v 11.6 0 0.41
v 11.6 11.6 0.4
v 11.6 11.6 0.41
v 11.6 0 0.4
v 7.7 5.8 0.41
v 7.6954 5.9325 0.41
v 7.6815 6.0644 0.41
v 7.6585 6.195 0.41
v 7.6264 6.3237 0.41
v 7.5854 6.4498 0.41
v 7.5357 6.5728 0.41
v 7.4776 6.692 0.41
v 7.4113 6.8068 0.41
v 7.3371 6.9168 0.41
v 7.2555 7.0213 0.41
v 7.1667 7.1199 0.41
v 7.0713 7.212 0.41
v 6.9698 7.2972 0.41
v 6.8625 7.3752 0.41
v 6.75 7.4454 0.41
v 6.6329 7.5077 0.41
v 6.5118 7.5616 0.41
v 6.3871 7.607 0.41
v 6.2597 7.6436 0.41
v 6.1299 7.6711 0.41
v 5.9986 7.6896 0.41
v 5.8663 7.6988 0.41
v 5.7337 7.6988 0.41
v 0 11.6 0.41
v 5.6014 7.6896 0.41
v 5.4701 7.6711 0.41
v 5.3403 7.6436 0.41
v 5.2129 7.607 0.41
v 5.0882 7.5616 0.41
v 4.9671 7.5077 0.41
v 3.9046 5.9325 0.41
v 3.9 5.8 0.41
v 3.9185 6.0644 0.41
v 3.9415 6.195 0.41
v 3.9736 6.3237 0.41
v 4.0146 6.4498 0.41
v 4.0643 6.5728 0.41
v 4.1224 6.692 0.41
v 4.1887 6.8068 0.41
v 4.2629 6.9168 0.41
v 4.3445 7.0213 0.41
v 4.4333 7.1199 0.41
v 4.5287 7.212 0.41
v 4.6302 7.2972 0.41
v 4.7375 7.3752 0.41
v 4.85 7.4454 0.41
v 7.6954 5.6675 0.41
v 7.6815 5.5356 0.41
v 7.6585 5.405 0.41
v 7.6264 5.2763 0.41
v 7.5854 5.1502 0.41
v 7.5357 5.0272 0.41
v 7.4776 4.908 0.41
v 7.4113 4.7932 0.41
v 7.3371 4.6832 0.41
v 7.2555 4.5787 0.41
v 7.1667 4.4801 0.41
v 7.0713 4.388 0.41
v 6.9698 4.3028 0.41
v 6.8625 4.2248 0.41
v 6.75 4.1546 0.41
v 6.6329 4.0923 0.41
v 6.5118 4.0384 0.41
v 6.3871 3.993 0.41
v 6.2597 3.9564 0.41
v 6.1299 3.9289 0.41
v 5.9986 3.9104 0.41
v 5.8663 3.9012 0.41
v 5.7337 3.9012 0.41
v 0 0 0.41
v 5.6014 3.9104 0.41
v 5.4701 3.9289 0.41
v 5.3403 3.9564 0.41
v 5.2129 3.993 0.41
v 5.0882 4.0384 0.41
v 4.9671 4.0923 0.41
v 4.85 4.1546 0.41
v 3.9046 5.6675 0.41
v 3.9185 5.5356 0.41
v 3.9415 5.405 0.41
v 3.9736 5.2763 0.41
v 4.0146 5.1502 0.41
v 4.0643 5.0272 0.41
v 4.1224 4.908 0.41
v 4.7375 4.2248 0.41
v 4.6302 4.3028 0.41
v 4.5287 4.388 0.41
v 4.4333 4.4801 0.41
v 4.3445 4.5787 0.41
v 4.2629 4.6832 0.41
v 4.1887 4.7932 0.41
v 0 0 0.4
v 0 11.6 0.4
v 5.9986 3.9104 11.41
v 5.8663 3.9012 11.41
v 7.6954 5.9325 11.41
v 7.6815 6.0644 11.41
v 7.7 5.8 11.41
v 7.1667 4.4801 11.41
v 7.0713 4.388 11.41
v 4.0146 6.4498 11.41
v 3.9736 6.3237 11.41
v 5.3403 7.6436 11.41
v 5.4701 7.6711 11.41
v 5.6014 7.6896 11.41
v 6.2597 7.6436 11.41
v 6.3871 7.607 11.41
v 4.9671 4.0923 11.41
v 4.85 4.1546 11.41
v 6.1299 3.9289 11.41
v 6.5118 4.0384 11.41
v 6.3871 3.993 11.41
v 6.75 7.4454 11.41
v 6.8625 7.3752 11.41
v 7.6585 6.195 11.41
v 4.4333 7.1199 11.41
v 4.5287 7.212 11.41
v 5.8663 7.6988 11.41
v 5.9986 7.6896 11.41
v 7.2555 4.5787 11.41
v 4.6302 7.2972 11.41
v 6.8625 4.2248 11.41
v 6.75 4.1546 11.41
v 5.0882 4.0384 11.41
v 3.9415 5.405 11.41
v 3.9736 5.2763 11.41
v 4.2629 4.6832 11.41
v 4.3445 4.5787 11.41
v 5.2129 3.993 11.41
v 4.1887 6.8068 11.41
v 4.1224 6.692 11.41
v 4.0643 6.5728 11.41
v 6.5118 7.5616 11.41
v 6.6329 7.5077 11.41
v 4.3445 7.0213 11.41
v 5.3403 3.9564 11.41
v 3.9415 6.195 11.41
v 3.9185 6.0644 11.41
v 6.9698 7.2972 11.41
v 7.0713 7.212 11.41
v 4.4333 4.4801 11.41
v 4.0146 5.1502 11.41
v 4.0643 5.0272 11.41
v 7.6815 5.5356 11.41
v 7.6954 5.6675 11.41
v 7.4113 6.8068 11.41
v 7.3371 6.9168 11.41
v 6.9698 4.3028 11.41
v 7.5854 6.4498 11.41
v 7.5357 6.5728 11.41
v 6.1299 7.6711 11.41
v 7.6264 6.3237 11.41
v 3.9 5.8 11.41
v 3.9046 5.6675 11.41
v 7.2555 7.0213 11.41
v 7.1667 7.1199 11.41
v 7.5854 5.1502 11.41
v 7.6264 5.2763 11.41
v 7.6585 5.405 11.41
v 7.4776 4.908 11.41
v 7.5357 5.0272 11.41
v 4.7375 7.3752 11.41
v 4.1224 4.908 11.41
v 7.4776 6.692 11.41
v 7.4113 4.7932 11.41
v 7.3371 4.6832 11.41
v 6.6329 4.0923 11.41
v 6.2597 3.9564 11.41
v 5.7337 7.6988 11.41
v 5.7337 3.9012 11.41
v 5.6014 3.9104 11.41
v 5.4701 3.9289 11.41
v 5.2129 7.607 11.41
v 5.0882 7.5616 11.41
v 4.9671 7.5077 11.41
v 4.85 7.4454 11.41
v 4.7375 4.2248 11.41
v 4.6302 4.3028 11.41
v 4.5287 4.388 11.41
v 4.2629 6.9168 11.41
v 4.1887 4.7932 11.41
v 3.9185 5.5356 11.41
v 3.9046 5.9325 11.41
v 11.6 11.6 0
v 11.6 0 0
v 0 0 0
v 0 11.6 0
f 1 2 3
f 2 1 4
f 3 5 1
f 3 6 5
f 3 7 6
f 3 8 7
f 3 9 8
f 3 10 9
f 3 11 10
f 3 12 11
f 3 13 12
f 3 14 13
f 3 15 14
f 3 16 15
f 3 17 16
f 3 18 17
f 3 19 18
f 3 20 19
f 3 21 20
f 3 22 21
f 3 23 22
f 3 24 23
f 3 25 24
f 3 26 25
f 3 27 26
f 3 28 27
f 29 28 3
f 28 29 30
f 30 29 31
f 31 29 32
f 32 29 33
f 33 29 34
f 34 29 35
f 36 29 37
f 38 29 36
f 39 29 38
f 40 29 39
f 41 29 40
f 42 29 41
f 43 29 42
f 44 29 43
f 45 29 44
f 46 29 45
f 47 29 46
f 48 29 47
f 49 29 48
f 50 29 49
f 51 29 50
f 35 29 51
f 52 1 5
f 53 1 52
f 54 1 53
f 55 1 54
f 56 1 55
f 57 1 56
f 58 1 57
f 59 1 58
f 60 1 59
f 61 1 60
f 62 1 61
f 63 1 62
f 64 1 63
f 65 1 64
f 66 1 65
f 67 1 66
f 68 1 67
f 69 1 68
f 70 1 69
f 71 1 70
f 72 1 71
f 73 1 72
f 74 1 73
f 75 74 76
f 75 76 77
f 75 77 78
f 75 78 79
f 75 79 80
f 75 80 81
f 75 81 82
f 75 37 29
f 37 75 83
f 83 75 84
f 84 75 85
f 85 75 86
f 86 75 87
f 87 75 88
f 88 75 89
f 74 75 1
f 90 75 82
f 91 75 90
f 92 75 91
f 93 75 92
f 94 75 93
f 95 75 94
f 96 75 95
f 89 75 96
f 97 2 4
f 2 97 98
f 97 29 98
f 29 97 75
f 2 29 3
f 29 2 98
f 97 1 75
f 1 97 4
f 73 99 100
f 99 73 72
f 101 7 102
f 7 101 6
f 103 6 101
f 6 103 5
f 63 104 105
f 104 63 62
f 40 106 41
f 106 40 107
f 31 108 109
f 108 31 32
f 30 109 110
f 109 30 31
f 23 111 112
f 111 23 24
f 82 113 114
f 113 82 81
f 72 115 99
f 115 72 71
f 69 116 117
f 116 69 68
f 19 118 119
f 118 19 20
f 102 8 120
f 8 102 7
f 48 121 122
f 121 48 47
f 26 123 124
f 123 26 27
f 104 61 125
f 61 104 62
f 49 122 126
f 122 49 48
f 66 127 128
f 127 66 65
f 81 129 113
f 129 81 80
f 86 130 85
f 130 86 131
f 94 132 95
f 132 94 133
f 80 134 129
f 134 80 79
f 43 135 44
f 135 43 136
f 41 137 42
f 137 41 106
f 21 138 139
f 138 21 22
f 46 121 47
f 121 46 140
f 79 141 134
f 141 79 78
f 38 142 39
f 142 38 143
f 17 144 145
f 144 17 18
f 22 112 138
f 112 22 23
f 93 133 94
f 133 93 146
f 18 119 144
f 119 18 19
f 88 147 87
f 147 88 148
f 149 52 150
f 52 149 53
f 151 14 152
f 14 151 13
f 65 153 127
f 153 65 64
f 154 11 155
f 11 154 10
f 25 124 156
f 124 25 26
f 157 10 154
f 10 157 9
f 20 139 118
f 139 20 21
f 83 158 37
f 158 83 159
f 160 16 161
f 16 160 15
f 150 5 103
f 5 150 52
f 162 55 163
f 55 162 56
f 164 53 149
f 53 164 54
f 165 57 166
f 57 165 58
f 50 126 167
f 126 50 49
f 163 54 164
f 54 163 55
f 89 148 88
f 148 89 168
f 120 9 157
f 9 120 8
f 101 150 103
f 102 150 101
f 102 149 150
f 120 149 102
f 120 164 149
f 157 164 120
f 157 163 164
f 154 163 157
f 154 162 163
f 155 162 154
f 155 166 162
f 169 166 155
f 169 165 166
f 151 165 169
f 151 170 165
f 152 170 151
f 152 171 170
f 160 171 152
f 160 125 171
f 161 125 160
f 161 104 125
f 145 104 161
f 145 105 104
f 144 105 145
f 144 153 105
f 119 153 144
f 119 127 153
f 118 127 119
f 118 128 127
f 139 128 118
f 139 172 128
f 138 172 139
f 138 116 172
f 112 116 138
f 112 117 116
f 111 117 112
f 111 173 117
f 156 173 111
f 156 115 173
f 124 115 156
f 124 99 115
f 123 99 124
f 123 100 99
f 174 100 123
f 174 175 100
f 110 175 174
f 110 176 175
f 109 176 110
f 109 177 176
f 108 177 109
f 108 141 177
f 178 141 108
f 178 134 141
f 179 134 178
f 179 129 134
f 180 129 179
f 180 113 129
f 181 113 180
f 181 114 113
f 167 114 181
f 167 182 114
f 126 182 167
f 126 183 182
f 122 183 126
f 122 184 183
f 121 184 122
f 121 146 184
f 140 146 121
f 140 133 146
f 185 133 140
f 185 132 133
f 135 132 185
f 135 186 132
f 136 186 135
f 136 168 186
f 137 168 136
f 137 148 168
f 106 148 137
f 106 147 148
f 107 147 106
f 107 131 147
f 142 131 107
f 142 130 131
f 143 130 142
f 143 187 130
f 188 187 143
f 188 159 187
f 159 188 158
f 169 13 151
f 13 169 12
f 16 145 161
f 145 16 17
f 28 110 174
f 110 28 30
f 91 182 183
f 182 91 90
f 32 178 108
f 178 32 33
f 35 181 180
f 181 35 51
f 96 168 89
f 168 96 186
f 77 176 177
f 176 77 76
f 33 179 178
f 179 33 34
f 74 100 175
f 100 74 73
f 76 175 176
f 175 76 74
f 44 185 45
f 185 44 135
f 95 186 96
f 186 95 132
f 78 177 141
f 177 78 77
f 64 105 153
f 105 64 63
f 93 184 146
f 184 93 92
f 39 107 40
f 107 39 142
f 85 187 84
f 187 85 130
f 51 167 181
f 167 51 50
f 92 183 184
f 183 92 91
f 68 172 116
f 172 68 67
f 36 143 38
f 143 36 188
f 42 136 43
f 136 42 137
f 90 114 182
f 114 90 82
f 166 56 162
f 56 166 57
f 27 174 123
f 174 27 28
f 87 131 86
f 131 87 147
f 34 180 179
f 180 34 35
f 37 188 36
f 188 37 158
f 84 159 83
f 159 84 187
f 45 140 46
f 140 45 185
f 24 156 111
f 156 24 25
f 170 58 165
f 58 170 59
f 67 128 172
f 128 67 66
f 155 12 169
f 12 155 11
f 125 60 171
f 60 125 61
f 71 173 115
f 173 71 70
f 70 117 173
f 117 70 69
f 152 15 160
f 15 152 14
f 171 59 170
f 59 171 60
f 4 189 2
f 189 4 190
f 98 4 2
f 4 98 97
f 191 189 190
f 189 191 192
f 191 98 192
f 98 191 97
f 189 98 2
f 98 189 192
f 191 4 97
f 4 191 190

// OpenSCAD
// file: ../../Base/Rotation.scad
// Fischertechnik Box Foundation
// Geometry Helpers Rotation

include <PlacementOptions.scad>

// getRotatedSpace(space, rotation=NoRotation)
// Rotates the space dependent on the specified rotation

function getRotatedSpace(space, rotation=NoRotation) = [
    (rotation == Rotate90 || rotation == Rotate270) ? space.y : space.x,
    (rotation == Rotate90 || rotation == Rotate270) ? space.x : space.y
];

// Rotates the given space around the fixed left lower corner
// space = the space the children needs as width/depth list [width,depth]
// rotation = 0 Rotate0 degrees, 1 Rotate90 degrees, 2 Rotate180 degrees, 3 Rotate270 degrees (equivalent to -90)

module RotateFix(space, rotation=NoRotation) {
    dy = (rotation == Rotate0 || rotation == Rotate270) ? 0 :
        (rotation == Rotate90) ? space.x :
        space.y;
    dx = (rotation < Rotate180) ? 0 :
        (rotation == Rotate180) ? space.x :
        space.y;
    
    translate([dx, dy, 0])
        rotate([0, 0, rotations[rotation]])
            children();
}
// file: ../../Base/Alignment.scad
// Fischertechnik Box Foundation
// Geometry Helpers Alignment

include <PlacementOptions.scad>

// getAlignedX(elementWidth, spaceWidth, align=AlignRight, offset=0)
// Gets the aligned X offset of an element with the given
// width in the given space.
// elementWidth = The width of the element to positon
// spaceWidth = The space where the element should be aligned
// align = 0 AlignLeft, 1 AlignCenter, 2 AlignRight
// offset = an optional offset from the aligned position. When
// aligned left or centered, then positive values are in X direction.
// When aligned right then positive values are in negative X direction.

function getAlignedX(elementWidth, spaceWidth, align=AlignRight, offset=0) =
    (align == AlignLeft) ?
        offset :
        ((align == AlignCenter) ?
        (spaceWidth - elementWidth)/2 + offset :
        spaceWidth - offset - elementWidth);

// getAlignedY(elementDepth, spaceDepth, align=AlignTop, offset=0)
// Gets the aligned Y offset of an element with the given
// depth in the given space.
// elementDepth = The depth of the element to positon
// spaceDepth = The space where the element should be aligned
// align = 0 AlignBottom, 1 AlignCenter, 2 AlignTop
// offset = an optional offset from the aligned position. When
// aligned bottom or centered, then positive values are in Y direction.
// When aligned top then positive values are in negative Y direction.

function getAlignedY(elementDepth, spaceDepth, align=AlignTop, offset=0) =
    (align == AlignBottom) ?
        offset :
        ((align == AlignCenter) ?
        (spaceDepth - elementDepth)/2 + offset :
        spaceDepth - offset - elementDepth);
// file: ../../Base/PlacementOptions.scad
// Fischertechnik Box Foundation
// Placement Options

// Alignment
NoAlign = 0;
AlignLeft = 1;
AlignBottom = 2;
AlignCenter = 3;
AlignRight = 4;
AlignTop = 5;

// Element rotation degree steps
rotations = [0, -90, -180, -270];

// Rotation
NoRotation = 0;
Rotate0 = 0;
Rotate90 = 1;
Rotate180 = 2;
Rotate270 = 3;

// Docking (seen from above)
NoDock = -1;
DockLeft = 0;
DockTop = 1;
DockRight = 2;
DockCorner = 2;
DockBottom = 3;

// Web corners
LowerLeft = 0;
UpperLeft = 1;
UpperRight = 2;
LowerRight = 3;

// Web position relative to corner
LeftOfCorner = 0;
RightOfCorner = 1;

// Rails direction
Horizontal = true;
Vertical = false;
// file: ../../Base/Boxes.scad
// Fischertechnik Box Foundation
// Pre-designed Boxes

use <Constants.scad>

include <PlacementOptions.scad>

box190Width = 190;
box190Depth = 130;
box130Width = 130;
box130Depth = 95;

// Values are from an original ec3 box
topBottomDifference = 1.5;
outerHeight = 40;
baseThickness = 1.8;
innerHeight = outerHeight - baseThickness;
stackExcess = 5.7;
radius = 3.5;
wallThickness = 1.5;
tolerance = 0.2;

boxWallThickness = wallThickness;
boxBaseThickness = baseThickness;
boxWebWidth = 3.0;

// getBoxWallThickness()
// Gets the wall thickness of a Fischertechnik Box
function getBoxWallThickness() = boxWallThickness;

// getBoxUsageHeight(height = 38.2)
// Gets the usable height of a Fischertechnik box
// height = Outer height of the box from the bottom to the upper edge.
function getBoxUsageHeight(height = outerHeight) = height - baseThickness - stackExcess;

// getBoxInnerHeight()
// Gets the inner height of a Fischertechnik box, including the stack excess
function getBoxInnerHeight() = innerHeight;

// getBoxBaseThickness()
// Gets the thickness of the Fischertechnik box base.
function getBoxBaseThickness() = boxBaseThickness;

// getBoxWebWidth()
// Gets the width of a box web
function getBoxWebWidth() = boxWebWidth;

// getBox190Space()
// Gets the usable inner space of a Box 190 as an x/y-list
function getBox190Space() = [
    box190Width - 2*getBoxWallThickness() - topBottomDifference, 
    box190Depth - 2*getBoxWallThickness() - topBottomDifference ];

// RoundedCornerPlate(width, depth, height, radius)
// Creates a body plate with rounded corners for a box. Used
// also to create the complete box with the hull module.
// width = Width of the plate
// depth = depth of the plate 
// height = thickness of the plate
// radius = radius of the rounded corner
module RoundedCornerPlate(width, depth, height, radius) {
    translate([radius, radius])
    hull() {
        w = width-2*radius;
        d = depth-2*radius;
        cube([w, d, height]);
        cylinder(height, r=radius, $fn=getFragments());
        translate([w, 0])
            cylinder(height, r=radius, $fn=getFragments());
        translate([w, d])
            cylinder(height, r=radius, $fn=getFragments());
        translate([0, d])
            cylinder(height, r=radius, $fn=getFragments());
    }
}

// BoxBase(width, depth)
// Creates an empty stackable Fischertechnik compatible box
// width = Outer width of the box (190, 130, ...)
// depth = Outer depth of the box (130, 95, ...)

module BoxBase(width, depth, height=outerHeight) {    
    thinPlate = 0.01;

    innerHeight = height - baseThickness;    
    
    module Body(tolerance=tolerance) {
        hull() {
            // Bottom with tolerance to fit into the original boxes when stacked
            translate([-wallThickness+tolerance, -wallThickness+tolerance, -baseThickness])
                RoundedCornerPlate(width-topBottomDifference-2*tolerance, depth-topBottomDifference-2*tolerance, thinPlate, radius);
            
            // Top
            translate([-wallThickness-topBottomDifference/2, -wallThickness-topBottomDifference/2, innerHeight-thinPlate])
                RoundedCornerPlate(width, depth, thinPlate, radius);
         }
    }

    module Cutoff() {
        hull() {
            coWidth = width - 2*wallThickness;
            coDepth = depth - 2*wallThickness;
            
            // Bottom
            RoundedCornerPlate(coWidth-topBottomDifference, coDepth-topBottomDifference, thinPlate, radius);

            // Top
            translate([-topBottomDifference/2, -topBottomDifference/2, innerHeight+thinPlate]) 
                RoundedCornerPlate(coWidth, coDepth, thinPlate, radius);
        }
    }
    
    difference() {        
        Body();
        Cutoff();
        stackOffset = innerHeight - stackExcess;
        translate([0, 0, stackOffset + baseThickness])
            Body(tolerance=0);
    }
}

// Creates the Fischertechnik empty box 130x190 mm and places it at position 0,0
// 190x130 are the outer sizes, the inner space is slightly smaller. Use getBox190Space() to get the inner sizes.
// The box is positioned that the usable inner space is at the 0,0,0 position.

module Box190() {
    BoxBase(box190Width, box190Depth);
}

// Gets the usable inner space of a Box 130 as an x/y-list
function getBox130Space() = [
    box130Width - 2*getBoxWallThickness() - topBottomDifference, 
    box130Depth - 2*getBoxWallThickness() - topBottomDifference ];

// Creates the Fischertechnik empty box 95x130 mm and places it at position 0,0
// 190x130 are the outer sizes, the inner space is slightly smaller. Use getBox190Space() to get the inner sizes.
// The box is positioned that the usable inner space is at the 0,0,0 position.

module Box130() {
    BoxBase(box130Width, box130Depth);
}

// Creates a web at the specified box walls
// corner 0 = LowerLeft, 1 = UpperLeft, 2 = UpperRight, 3 = LowerRight
// side 0 = LeftOfCorner, 1 = RightOfCorner
// distance = Distance in mm from the corner
// boxSpace = inner width and depth of the box (default: Box 190)
// webWidth = length of the web (default is 3 mms)
// webThickness = thickness of the web (default is 1 mm)
// height = Height of the web (standard is getBoxUsageHeight())
// sink = How much of the web is sunk into the wall

module BoxWeb(
    corner, 
    side, 
    distance, 
    boxSpace=getBox190Space(), 
    webWidth=getBoxWebWidth(), 
    webThickness=1.0, 
    height=getBoxUsageHeight(),
    sink = getBoxWallThickness()/2) {
    width = (corner % 2 == 0) ? 
            (side == LeftOfCorner ? webWidth : webThickness) :
            (side == LeftOfCorner ? webThickness : webWidth);

    depth = (corner % 2 == 0) ? 
            (side == RightOfCorner ? webWidth : webThickness) :
            (side == RightOfCorner ? webThickness : webWidth);
    
    xDiff = corner == LowerLeft ? 
                (side == LeftOfCorner ? -sink : distance) :
            (corner == UpperLeft ?                
                (side == LeftOfCorner ? distance : -sink) :
            (corner == UpperRight ?
                (side == LeftOfCorner ? boxSpace.x-webWidth+sink : boxSpace.x-distance-webThickness) :
                (side == LeftOfCorner ? boxSpace.x-distance-webThickness: boxSpace.x-webWidth+sink)));

    yDiff = corner == LowerLeft ? 
                (side == RightOfCorner ? -sink : distance) :
            (corner == UpperLeft ?
                (side == RightOfCorner ? boxSpace.y-distance-webThickness : boxSpace.y-webWidth+sink) :
            (corner == UpperRight ?
                (side == RightOfCorner ? boxSpace.y-webWidth+sink : boxSpace.y-distance-webThickness) :
                (side == RightOfCorner ? distance : -sink)));
    
    translate([xDiff, yDiff, -getExcess()])
        cube([width, depth, height + 2*getExcess()]);
}
// file: ../../Base/Placement.scad
// Fischertechnik Box Foundation
// Geometry Helpers Placement

use <Constants.scad>
use <Alignment.scad>
use <Rotation.scad>
use <Boxes.scad>

include <PlacementOptions.scad>

// Place(x=0, y=0, elementSpace=[0,0], alignX=AlignLeft, alignY=AlignBottom, rotation=Rotate0, boxSpace=getBox190Space())
// Places the child at the specified position
// y = Y-Position. This is a relative position when an X aligment is specified.
// x = X-Position. This is a relative position when an Y aligment is specified.
// elementSpace = space of the element to be placed [x,y]
// alignX = -1=NoAlign, 0 AlignLeft, 1 AlignCenter, 3 AlignRight (elementSpace and boxSpace required!)
// alignY = -1=NoAlign, 2 AlignBottom, 1 AlignCenter, 4 AlignTop (elementSpace and boxSpace required!)
// rotation = 0 Rotate0 0 degrees, 1 Rotate90 90 degrees, 
// 2 Rotate180 180 degrees, 3 Rotate270 270 degrees (equivalent to -90)
// boxSpace = Inner space of the box where the placement occurs [x,y] - default is Box 190x130 inner space

module Place(x=0, y=0, elementSpace=[0,0], 
  alignX=AlignLeft, alignY=AlignBottom, 
  rotation=NoRotation, boxSpace=getBox190Space()) {

    module Position(x, y, space, rotation=Rotate0) {
        translate([x, y, 0])
            RotateFix(space, rotation)
                children();
    }

    space = getRotatedSpace(elementSpace, rotation);
    alignedX = getAlignedX(space.x, boxSpace.x, alignX, x);
    alignedY = getAlignedY(space.y, boxSpace.y, alignY, y);
    Position(alignedX, alignedY, elementSpace, rotation)
        children();
}

// Center(space=getBox130Space(), elementSpace=[0,0])
// space = Space where the children is centered. For cylinder use centered=true and no elementSpace.
// elementSpace = space of the element to be centered [x,y]

module Center(space=getBox190Space(), elementSpace=[0,0]) {
    Place(elementSpace=elementSpace, boxSpace=space, alignX=AlignCenter, alignY=AlignCenter)
        children();
}

// CenterHorizontal(width=0, y=0, offset=0, space=getBox130Space())
// width = Width of the element to be placed.
// y = Y position of the element
// offset = Offset from the center position (negative will be left of the center)
// space = Space where the element is placed

module CenterHorizontal(width=0, y=0, offset=0, space=getBox190Space()) {
    Place(x=offset, y=y, elementSpace=[width, 0], boxSpace=space, alignX=AlignCenter)
        children(0);
}

// CenterVertical(depth=0, x=0, offset=0, space=getBox130Space())
// depth = Depth of the element to be placed.
// x = X position of the element
// offset = Offset from the center position (negative will be down of the center)
// space = Space where the element is placed

module CenterVertical(depth=0, x=0, offset=0, space=getBox190Space()) {
    Place(x=x, y=offset, elementSpace=[0, depth], boxSpace=space, alignY=AlignCenter)
        children(0);
}

// getIsVertical(align)
// True if the specified alignment needs a vertical orientation for a divider (AlignRight, AlignLeft)

function getIsVertical(align) = (align == AlignRight || align == AlignLeft);

// getIsHorizontal(align)
// True if the specified alignment needs a horizontal orientation for a divider (AlignTop, AlignBottom)

function getIsHorizontal(align) = (align == AlignTop || align == AlignBottom);
// file: ../../Elements/AxisClip10.scad
// Fischertechnik Box Library
// Axis for clip 10
// 31023

use <../ModelBase/Simple.scad>
use <../Base/Constants.scad>

/* [Element Parameters] */
height = 23;
clipHeight = 10;

/* [Hidden] */
width = 12;
depth = 12;
upperDiameter = 3.6;

// getAxisClip10Space()
// Gets the space of a n axis for a clip 10 with spring ring (mot2)

function getAxisClip10Space() = [width, depth, height];

// AxisClip10(height, clipHeight)
// Axis for clip 10 with spring ring (mot2)
// height = Height of the complete axis (standard is 23, in mot3 its only 12)
// clipHeight = Height of the part for the clip (standard is 10, in mot3 its only 7)

module AxisClip10(height=height, clipHeight=clipHeight) {
    LeveledAxisWithSpace(height, height-clipHeight, getAxisClip10Space(), diameter=upperDiameter);
}

// Test
color("lightgray")
AxisClip10(height, clipHeight);
// file: ../../Base/Constants.scad
// Fischertechnik Box Foundation
// Constants

// Constant values necessary for multiple elements

// Base constants
dividerThickness = 1.2;
excess = 0.01;
fragments = 90;
tolerance = 0.8;

// Gets the thickness of a divider 
function getDividerThickness() = dividerThickness;

// Gets the excess that is used to merge walls into each other
function getExcess() = excess;

// Gets amount of fragments of a cylinder
function getFragments() = fragments;

// Gets the inner tolerance of a frame to each side
function getTolerance() = tolerance;


// Fischertechnik specific constants
axisDiameter = 4;
axisBottomDiameter = axisDiameter + 1;
axisTolerance = 0.2;
axisLockingLength = 8;

// Gets axis diameter of Fischertechnik axis
function getAxisDiameter() = axisDiameter;

// Gets axis diameter tolerance (subtracted for element axis)
function getAxisTolerance() = axisTolerance;

// Gets the axis diameter for standing axis
function getStandAxisDiameter() = getAxisDiameter() - getAxisTolerance();

// Gets axis bottom diameter for thicker part at the bottom
function getAxisBottomDiameter() = axisBottomDiameter;

// Gets the lengthh of the locking part of a locking axis
function getAxisLockingLength() = axisLockingLength;

// Studs

studHeight = 2.5;
studTolerance = 0.2;

// gets the height of a connecting stud
function getStudHeight() = studHeight;

// gets the connecting stud height tolerance
function getStudTolerance() = studTolerance;

// Dockable Frame with Edge

standardEdgeDistance = 2.5;
standardWebDistance = 11.5;
standardCornerLength = 15;

// gets the standard distance to the wall of the box for dockable frames with webs
function getStandardEdgeDistance() = standardEdgeDistance;

// gets the standard distance of each web to the corner of the dockable frame
function getStandardWebDistance() = standardWebDistance;

// gets the standard length of the corner walls of a dockable frame
function getStandardCornerLength() = standardCornerLength;

// Tubes

tubeWallFactor = 0.8;

// gets the wall thickness of a tube.
function getTubeWallThickness() = tubeWallFactor * getDividerThickness();

// Small Parts and Divider Frame

smallPartsFrameHeight = 20;

// gets the frame height for docked small parts boxes.
function getSmallPartsFrameHeight() = smallPartsFrameHeight;

// Hubs

hubRingDiameter = 19.5;
hubRingLevelDiameter = 21;

// gets the diameter of a tube matching the inner ring of a wheel
function getHubRingDiameter() = hubRingDiameter;

// gets the diameter of a hub tube with a thicker diameter
function getHubRingLevelDiameter() = hubRingLevelDiameter;

// Struts

strutAddLength = 9.0;
strutDepth = 8.0;

// gets the full length of a strut
function getFullStrutLength(length) = length + strutAddLength;

// gets the radius of the end of a strut
function getStrutEndRadius() = strutAddLength / 2;

// gets the the depth of a strut
function getStrutDepth() = strutDepth;

// Propeller

propellerAxisDiameter = 7.0;
propellerAxisTolerance = 0.2;

// gets the propeller axis outer diameter
function getPropellerAxisDiameter() = propellerAxisDiameter;

// gets the propeller axis printing tolerance
function getPropellerAxisTolerance() = propellerAxisTolerance;
// file: ../../Elements/AxisPropellerTip.scad
// Fischertechnik Box Library
// Axis for propeller tip
// 37681

use <../Base/Constants.scad>
use <../ModelBase/Simple.scad>

/* [Hidden] */
space = 11.6;

// getAxisPropellerTipSpace()
// Gets the space the axis for a propeller tip needs as width and depth (.x and .y as a list)

function getAxisPropellerTipSpace() = [space, space];

// AxisPropellerTip()
// Standing axis for a propeller tip 37681

module AxisPropellerTip() {
    height = 11;
    AxisWithSpace(height, getAxisPropellerTipSpace());
}

// Tests
color("lightgray")
AxisPropellerTip();
// file: ../TestPrint.scad
// 3D Print Test Base

use <../Base/Constants.scad>

use <../Elements/AxisClip10.scad>

module TestPrint(elementSpace) {
    cube([elementSpace.x, elementSpace.y, 0.4]);
    translate([0,0,0.4+getExcess()]) {
        children();
    }
}

TestPrint(getAxisClip10Space())
    AxisClip10();
// main file
// 3D Print Test
// AxisPropellerTip

use <../TestPrint.scad>
use <../../Elements/AxisPropellerTip.scad>

TestPrint(getAxisPropellerTipSpace())
    AxisPropellerTip();
